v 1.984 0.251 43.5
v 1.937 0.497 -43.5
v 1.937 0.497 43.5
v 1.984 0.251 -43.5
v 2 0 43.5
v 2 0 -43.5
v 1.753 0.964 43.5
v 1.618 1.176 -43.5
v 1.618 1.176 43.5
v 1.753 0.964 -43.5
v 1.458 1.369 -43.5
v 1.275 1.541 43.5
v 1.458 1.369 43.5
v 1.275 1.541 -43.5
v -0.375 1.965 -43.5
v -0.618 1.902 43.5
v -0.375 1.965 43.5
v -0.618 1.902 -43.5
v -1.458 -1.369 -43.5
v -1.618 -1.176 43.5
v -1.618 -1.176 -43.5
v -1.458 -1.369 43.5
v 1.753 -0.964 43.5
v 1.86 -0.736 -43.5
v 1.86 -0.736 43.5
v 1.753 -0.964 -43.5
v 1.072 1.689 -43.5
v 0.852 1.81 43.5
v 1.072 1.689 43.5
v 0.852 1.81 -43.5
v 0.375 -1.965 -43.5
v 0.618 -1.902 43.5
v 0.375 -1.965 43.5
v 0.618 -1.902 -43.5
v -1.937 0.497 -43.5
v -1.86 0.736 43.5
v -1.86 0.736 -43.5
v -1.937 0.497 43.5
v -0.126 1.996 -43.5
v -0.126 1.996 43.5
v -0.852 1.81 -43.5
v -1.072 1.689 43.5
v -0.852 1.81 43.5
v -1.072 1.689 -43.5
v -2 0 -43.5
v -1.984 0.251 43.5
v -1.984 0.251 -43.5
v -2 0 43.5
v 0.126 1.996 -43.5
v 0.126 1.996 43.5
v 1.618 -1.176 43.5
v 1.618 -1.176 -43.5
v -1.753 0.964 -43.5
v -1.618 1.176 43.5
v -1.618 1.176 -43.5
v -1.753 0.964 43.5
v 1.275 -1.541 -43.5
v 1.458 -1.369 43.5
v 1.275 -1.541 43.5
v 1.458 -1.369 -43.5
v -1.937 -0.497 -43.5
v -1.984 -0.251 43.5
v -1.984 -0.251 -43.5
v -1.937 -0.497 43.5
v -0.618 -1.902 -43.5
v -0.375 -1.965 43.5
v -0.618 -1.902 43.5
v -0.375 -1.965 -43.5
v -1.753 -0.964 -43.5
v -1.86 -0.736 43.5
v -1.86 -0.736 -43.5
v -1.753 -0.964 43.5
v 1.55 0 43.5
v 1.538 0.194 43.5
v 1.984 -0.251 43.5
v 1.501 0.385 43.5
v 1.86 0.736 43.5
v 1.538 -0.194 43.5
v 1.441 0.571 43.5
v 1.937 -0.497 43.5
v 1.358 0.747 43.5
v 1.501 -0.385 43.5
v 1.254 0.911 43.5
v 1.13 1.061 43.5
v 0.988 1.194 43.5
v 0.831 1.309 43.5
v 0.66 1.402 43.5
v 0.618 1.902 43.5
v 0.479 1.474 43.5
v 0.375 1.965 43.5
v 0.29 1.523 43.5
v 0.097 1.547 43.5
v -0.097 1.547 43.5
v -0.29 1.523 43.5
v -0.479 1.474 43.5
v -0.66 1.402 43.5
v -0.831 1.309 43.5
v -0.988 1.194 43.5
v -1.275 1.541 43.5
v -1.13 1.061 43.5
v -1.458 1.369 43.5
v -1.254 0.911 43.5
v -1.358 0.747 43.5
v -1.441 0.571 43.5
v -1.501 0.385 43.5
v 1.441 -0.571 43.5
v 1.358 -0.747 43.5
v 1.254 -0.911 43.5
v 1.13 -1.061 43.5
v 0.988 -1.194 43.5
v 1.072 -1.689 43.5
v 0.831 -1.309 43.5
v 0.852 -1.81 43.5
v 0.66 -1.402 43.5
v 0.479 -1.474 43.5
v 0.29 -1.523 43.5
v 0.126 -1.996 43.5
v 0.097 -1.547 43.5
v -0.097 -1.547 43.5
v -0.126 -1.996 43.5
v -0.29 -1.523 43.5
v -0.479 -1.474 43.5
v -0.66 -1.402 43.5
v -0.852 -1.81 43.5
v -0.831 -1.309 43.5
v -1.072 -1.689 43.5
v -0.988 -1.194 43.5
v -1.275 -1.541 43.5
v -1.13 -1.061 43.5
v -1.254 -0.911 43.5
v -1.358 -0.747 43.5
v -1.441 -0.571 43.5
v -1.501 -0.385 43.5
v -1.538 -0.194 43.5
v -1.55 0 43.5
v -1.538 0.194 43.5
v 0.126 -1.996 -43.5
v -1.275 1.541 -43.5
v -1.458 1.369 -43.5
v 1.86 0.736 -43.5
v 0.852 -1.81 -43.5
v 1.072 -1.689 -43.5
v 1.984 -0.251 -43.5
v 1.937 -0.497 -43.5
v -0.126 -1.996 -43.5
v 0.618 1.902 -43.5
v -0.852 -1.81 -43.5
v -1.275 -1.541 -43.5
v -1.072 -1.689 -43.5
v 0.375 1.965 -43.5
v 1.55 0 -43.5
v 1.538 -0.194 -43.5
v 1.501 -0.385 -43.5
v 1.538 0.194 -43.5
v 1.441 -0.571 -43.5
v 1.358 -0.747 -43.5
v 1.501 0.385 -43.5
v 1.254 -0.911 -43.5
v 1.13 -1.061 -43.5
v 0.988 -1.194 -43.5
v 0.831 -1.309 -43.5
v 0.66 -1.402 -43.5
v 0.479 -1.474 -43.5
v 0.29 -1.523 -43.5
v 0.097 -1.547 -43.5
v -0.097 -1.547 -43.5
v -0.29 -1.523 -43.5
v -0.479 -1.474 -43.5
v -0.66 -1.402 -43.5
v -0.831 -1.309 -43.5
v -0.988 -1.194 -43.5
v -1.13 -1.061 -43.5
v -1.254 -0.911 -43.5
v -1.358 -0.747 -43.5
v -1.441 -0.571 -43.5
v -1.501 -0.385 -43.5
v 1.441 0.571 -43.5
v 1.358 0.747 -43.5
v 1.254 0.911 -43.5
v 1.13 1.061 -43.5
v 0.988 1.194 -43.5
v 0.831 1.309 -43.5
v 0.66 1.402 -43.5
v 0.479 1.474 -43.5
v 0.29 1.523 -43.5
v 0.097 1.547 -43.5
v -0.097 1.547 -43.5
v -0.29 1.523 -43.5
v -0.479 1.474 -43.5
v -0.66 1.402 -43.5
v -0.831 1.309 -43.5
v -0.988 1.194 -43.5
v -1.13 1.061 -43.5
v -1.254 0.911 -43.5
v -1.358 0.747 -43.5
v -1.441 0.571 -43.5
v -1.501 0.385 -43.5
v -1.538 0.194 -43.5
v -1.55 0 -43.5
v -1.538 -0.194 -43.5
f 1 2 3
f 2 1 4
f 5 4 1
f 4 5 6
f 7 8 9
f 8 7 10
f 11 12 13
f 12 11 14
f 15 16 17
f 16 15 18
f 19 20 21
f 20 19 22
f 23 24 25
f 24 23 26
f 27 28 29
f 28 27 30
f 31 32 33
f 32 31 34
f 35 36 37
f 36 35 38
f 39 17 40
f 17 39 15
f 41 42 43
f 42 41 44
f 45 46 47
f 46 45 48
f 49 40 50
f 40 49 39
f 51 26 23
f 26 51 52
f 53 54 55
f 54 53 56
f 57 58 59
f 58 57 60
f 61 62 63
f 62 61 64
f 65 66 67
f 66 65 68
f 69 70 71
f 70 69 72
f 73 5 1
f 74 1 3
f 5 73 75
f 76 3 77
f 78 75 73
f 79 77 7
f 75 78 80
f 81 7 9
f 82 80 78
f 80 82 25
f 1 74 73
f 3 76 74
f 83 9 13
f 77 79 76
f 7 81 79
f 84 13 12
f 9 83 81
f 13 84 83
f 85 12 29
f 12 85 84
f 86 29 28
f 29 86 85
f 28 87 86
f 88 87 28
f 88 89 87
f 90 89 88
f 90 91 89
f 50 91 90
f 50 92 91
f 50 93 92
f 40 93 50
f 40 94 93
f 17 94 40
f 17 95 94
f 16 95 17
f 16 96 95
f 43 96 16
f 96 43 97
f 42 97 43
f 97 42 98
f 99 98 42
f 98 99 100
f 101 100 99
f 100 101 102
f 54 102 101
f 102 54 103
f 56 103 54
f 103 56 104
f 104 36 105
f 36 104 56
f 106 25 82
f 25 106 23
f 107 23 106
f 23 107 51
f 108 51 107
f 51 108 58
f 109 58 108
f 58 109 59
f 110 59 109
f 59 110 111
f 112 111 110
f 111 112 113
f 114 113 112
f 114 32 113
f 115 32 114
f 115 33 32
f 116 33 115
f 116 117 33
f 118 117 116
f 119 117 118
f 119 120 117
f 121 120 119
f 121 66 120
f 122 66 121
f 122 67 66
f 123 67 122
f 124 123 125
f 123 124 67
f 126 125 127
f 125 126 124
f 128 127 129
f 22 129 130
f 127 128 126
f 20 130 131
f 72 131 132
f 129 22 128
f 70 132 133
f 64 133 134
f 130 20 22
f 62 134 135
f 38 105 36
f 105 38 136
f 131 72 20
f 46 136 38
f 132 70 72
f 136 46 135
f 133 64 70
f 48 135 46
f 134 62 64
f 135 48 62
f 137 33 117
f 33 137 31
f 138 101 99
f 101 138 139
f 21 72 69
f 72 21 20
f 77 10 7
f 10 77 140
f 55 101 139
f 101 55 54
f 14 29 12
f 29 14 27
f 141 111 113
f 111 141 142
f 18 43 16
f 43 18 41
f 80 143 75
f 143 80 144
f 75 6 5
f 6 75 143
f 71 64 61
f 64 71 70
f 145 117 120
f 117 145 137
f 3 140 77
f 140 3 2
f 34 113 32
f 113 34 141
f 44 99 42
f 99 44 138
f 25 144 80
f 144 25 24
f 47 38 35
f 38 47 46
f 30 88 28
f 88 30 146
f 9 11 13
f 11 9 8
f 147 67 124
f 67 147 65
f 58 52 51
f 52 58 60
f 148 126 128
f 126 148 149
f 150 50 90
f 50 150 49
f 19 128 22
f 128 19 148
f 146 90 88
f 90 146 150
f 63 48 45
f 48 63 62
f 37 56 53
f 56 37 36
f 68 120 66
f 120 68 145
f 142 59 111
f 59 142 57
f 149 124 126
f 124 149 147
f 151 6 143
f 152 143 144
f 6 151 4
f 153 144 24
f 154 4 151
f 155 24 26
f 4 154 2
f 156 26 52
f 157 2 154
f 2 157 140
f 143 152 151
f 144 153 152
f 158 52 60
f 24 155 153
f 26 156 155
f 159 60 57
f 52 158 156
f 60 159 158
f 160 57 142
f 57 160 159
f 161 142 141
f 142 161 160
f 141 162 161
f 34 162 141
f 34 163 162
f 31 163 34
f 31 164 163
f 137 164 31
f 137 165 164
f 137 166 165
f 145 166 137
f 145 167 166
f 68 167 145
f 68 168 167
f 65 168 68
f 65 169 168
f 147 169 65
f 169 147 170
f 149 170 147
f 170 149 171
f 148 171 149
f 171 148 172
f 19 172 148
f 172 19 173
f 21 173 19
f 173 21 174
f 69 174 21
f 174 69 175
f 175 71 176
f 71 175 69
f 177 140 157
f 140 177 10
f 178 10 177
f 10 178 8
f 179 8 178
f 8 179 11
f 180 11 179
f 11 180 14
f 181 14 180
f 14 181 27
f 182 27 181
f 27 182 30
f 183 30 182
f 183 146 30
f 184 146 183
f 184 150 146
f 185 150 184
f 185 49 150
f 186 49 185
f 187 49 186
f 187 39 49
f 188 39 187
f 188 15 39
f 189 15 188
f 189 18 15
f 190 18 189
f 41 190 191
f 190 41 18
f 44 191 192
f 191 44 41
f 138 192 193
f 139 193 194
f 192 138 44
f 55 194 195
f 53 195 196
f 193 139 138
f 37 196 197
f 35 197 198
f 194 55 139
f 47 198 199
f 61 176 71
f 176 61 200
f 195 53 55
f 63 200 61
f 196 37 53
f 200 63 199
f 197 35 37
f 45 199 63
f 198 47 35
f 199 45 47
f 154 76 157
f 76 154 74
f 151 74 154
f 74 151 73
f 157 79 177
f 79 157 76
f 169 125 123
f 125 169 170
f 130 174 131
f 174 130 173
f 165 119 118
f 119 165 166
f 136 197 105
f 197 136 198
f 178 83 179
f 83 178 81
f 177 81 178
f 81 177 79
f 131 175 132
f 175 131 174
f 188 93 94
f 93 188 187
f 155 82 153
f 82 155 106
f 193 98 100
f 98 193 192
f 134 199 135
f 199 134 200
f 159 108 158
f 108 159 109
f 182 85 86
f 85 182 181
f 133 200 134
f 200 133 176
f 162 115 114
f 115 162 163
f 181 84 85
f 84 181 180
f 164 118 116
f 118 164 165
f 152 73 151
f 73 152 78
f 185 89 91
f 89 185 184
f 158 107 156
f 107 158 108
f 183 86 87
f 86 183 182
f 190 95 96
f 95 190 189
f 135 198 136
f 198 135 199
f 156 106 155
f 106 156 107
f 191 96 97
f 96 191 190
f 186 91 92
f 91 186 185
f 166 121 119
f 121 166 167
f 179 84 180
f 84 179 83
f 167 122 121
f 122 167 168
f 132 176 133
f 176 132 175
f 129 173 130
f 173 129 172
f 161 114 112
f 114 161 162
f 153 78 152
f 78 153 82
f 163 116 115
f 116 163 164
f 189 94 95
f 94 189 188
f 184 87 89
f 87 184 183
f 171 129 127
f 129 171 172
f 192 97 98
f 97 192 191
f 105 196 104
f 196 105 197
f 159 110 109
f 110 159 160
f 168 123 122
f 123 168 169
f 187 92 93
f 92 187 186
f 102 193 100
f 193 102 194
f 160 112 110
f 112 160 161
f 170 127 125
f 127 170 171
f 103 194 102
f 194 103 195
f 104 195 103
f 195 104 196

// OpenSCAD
$fn = 50;


difference() {
	union() {
		translate(v = [0, 0, -43.5000000000]) {
			cylinder(h = 87, r = 2.0000000000);
		}
	}
	union() {
		translate(v = [0, 0, -100.0000000000]) {
			cylinder(h = 200, r = 1.5500000000);
		}
	}
}
